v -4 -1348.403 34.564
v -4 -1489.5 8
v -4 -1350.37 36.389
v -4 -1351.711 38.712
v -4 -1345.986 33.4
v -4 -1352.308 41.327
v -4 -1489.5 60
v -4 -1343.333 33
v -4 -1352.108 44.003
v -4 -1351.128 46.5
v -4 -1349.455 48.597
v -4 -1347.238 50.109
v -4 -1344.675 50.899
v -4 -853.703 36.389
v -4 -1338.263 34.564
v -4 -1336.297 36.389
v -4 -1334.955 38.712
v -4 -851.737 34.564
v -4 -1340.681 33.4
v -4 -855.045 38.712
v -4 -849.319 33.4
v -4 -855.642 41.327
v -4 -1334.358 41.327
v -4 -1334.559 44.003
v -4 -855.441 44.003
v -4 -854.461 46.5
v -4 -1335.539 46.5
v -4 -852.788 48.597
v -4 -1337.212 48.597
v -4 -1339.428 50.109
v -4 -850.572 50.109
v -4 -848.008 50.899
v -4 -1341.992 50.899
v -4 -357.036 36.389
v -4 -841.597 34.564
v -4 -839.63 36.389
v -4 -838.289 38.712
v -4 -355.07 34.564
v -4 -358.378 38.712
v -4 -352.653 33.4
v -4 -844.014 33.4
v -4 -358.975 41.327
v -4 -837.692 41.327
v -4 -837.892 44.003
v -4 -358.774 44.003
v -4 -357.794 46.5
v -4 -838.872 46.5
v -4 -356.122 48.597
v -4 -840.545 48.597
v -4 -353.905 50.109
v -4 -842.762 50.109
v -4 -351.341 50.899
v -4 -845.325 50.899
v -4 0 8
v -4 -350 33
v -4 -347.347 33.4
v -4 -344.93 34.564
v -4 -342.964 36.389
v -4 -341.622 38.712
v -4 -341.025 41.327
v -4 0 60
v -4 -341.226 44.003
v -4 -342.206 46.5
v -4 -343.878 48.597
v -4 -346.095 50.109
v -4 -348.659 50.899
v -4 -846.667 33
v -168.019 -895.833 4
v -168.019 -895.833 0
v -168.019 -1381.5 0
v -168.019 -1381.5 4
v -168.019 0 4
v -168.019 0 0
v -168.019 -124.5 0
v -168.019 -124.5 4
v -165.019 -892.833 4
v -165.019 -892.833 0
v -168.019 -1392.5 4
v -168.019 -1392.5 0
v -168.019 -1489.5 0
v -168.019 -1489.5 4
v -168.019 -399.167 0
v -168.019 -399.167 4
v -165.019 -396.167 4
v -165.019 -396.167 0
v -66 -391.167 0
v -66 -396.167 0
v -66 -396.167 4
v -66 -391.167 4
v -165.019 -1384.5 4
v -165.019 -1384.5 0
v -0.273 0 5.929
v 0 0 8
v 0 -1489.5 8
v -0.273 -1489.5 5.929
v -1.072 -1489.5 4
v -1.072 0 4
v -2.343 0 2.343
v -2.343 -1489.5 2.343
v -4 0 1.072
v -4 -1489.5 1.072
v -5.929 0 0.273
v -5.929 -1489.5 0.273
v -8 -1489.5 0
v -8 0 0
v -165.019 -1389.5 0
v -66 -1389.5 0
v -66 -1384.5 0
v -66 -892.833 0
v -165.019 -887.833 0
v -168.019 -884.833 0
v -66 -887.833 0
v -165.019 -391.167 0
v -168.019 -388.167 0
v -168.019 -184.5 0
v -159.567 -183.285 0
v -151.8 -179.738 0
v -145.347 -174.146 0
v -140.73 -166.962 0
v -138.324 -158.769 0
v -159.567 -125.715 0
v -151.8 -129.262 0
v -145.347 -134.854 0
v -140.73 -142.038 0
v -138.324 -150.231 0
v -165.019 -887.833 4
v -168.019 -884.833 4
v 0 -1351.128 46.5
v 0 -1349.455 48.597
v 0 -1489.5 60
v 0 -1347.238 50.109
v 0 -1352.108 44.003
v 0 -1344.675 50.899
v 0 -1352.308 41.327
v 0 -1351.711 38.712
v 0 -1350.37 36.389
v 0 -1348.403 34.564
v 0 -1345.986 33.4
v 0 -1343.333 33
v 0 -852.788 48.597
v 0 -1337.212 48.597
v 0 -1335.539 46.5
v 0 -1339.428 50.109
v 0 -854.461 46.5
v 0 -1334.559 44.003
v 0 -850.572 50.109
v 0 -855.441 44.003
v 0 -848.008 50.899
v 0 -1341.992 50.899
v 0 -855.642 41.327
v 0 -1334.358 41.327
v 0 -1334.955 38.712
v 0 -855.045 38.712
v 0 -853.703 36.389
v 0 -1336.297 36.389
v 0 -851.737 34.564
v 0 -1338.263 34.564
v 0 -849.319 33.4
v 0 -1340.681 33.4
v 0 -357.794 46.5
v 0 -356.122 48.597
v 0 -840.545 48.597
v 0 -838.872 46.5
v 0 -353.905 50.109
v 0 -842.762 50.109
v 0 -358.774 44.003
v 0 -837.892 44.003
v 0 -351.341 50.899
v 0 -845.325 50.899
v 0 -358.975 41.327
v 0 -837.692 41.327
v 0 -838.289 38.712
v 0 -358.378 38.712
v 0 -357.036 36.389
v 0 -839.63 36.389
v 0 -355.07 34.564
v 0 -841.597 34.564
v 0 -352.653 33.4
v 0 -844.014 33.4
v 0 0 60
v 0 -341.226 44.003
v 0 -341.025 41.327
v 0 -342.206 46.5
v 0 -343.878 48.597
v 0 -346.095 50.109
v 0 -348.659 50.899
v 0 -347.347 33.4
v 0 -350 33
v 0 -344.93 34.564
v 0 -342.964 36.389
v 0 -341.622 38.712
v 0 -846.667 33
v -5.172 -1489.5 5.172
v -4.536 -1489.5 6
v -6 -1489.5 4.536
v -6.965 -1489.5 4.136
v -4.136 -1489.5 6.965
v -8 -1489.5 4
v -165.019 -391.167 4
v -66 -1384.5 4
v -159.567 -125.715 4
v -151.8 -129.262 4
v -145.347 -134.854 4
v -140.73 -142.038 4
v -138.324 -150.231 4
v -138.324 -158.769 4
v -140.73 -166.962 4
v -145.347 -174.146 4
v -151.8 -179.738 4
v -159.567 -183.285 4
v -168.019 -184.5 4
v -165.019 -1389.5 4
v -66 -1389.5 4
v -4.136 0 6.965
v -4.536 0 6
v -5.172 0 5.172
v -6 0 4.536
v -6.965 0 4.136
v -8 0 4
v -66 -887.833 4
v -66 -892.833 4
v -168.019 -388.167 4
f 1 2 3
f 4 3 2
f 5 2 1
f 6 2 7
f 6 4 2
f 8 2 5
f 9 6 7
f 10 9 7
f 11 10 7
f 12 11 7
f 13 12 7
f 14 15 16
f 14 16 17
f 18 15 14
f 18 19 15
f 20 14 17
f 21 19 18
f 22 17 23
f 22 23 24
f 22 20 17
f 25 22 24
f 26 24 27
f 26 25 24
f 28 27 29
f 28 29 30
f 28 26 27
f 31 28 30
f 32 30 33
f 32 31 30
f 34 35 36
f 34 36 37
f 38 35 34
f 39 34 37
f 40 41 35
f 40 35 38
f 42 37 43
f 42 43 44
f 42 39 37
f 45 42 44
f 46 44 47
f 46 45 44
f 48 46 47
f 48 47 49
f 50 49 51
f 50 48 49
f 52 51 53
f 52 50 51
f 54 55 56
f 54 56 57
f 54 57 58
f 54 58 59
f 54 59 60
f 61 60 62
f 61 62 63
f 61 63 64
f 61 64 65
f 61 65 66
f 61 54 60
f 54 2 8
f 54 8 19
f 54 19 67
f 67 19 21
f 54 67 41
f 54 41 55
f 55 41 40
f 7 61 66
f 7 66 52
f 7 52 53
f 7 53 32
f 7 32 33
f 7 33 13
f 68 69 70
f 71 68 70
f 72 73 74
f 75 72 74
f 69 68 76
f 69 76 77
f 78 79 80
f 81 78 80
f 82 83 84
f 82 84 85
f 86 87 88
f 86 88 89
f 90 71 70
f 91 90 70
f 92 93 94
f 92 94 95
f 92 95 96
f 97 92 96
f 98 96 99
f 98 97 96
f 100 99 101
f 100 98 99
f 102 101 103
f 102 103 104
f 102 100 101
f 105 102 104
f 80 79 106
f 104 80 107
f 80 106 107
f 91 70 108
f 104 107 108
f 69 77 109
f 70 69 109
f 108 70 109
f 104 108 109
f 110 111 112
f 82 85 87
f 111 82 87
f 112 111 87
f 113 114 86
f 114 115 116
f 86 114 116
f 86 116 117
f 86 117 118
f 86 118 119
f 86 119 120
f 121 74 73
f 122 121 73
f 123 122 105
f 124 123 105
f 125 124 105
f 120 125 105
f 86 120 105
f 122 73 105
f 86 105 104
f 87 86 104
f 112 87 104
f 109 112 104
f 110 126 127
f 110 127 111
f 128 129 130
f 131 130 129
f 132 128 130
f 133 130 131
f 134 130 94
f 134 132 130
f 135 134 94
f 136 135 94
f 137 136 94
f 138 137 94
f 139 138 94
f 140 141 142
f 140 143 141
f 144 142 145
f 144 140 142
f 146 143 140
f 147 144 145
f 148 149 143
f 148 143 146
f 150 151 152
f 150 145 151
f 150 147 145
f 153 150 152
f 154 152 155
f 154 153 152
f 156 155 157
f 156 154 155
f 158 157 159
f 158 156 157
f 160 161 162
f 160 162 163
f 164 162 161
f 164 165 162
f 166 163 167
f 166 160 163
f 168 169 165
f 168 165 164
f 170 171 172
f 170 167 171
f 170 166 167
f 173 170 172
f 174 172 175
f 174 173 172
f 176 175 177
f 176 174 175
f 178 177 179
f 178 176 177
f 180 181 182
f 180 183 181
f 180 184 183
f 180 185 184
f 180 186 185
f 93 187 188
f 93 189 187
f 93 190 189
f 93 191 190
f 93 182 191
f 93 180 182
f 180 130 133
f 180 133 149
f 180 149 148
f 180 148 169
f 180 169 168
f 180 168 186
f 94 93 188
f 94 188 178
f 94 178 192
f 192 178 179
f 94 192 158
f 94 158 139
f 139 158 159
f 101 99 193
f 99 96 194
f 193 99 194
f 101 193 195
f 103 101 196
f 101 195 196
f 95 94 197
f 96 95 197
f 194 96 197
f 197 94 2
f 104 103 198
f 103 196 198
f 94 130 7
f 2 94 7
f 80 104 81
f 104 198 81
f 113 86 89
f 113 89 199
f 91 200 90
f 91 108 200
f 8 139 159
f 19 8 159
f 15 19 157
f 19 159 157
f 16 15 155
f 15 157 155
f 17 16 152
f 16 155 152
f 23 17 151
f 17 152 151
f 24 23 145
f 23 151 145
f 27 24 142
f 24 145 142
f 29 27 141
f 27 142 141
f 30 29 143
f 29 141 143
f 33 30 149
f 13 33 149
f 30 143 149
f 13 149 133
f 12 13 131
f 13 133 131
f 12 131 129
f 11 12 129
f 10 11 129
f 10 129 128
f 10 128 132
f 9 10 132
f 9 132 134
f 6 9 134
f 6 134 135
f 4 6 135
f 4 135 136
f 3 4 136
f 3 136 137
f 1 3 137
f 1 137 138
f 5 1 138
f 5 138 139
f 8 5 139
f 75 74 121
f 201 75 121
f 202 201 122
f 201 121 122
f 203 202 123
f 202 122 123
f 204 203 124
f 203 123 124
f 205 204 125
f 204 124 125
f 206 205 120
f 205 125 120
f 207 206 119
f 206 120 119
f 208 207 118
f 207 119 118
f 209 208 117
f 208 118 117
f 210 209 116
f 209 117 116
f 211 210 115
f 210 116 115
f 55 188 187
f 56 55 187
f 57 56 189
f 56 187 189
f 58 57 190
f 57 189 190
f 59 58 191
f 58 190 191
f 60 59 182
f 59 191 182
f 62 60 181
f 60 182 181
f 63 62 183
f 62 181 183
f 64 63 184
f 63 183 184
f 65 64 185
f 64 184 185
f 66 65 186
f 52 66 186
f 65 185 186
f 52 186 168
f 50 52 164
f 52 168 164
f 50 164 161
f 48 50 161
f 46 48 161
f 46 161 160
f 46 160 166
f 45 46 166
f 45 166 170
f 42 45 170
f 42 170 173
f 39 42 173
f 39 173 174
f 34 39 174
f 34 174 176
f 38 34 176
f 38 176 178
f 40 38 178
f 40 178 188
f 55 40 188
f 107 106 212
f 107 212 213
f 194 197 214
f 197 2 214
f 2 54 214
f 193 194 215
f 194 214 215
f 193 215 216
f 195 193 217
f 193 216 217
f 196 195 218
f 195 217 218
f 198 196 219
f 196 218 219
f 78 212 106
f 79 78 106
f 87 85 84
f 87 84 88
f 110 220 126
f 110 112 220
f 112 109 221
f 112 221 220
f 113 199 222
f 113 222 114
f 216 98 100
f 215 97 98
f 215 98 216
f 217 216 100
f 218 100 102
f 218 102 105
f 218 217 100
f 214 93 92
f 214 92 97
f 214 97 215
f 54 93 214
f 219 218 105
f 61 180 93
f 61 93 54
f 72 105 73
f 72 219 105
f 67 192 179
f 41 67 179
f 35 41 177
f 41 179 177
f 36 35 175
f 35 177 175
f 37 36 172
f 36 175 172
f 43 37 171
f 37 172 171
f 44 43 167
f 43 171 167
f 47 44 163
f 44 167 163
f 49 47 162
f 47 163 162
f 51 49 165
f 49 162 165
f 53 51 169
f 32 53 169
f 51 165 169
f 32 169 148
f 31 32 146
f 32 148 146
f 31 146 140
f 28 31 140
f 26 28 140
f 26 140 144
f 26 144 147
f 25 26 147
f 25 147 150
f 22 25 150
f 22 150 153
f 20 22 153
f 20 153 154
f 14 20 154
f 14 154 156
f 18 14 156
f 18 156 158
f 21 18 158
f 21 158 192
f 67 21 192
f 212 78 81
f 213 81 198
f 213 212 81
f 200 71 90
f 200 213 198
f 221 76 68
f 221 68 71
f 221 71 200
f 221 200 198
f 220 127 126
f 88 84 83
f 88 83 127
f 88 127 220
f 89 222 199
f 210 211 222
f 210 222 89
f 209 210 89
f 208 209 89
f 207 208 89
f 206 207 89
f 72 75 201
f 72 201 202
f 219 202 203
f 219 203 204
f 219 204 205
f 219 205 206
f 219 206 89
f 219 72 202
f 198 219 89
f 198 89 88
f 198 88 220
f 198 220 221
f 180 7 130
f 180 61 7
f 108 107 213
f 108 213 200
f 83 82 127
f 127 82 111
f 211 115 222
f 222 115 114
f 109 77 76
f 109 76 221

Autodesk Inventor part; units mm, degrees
ref_plane "YZ Plane" through (0, 0, 0) normal (1, 0, 0) x (0, 1, 0)
ref_plane "XZ Plane" through (0, 0, 0) normal (0, 1, 0) x (-1, 0, 0)
ref_plane "XY Plane" through (0, 0, 0) normal (0, 0, 1) x (1, 0, 0)
sketch "Sketch1" plane through (0, 0, 0) normal (0, 0, 1) x (1, 0, 0)
  line L0 (0, 0) -> (-168.019, 0)
  line L1 (-168.019, 0) -> (-168.019, -1489.5)
  line L2 (-168.019, -1489.5) -> (0, -1489.5)
  line L3 (0, -1489.5) -> (0, 0)
  line L4 (-168.019, -1389.5) -> (-66, -1389.5)
  line L5 (-66, -1389.5) -> (-66, -1384.5)
  line L6 (-66, -1384.5) -> (-168.019, -1384.5)
  line L7 (-168.019, -1384.5) -> (-168.019, -1389.5)
  line L8 (-168.019, -892.8333) -> (-66, -892.8333)
  line L9 (-66, -892.8333) -> (-66, -887.8333)
  line L10 (-66, -887.8333) -> (-168.019, -887.8333)
  line L11 (-168.019, -887.8333) -> (-168.019, -892.8333)
  line L12 (-168.019, -396.1667) -> (-66, -396.1667)
  line L13 (-66, -396.1667) -> (-66, -391.1667)
  line L14 (-66, -391.1667) -> (-168.019, -391.1667)
  line L15 (-168.019, -391.1667) -> (-168.019, -396.1667)
  circle A0 centre (-168.019, -154.5) radius 30
  point P0 (-168.019, -396.1667)
  point P1 (-168.019, -124.5)
  point P2 (-168.019, -184.5)
  dimension "d0" = 1489.5
  dimension "d1" = 168.019
  dimension "d2" = 5
  dimension "d4" = 100
  dimension "d7" = 496.6667
  dimension "d23" = 66
  dimension "d28" = 60
  dimension "d29" = 1335
extrude "Plate1" add sketch "Sketch1" along normal blind 4 contours L3 L2 L1 L4 L5 L6 L8 L9 L10 L12 L13 L14 A0 L0
sketch "Sketch2" plane through (-4, 0, 0) normal (1, 0, 0) x (0, 1, 0)
  line L0 (-1489.5, 0) -> (0, 0)
  line L1 (0, 0) -> (0, 60)
  line L2 (0, 60) -> (-1489.5, 60)
  line L3 (-1489.5, 60) -> (-1489.5, 0)
edge flange "Flange1" height 60 angle 90 thickness 4 bend radius 4 thickness toward (1, 0, 0) relief tear relief width 4 relief depth 2 edges at (0, -744.75, 4) wall of the first edge with corners at (-4, -1489.5, 0) (-4, 0, 0) (-4, 0, 60) (-4, -1489.5, 60)
bend "Bend1"
corner "Corner1"
chamfer "Corner Chamfer1" distance 3 angle 45 6 edges at (-168.019, -1389.5, 2) (-168.019, -1384.5, 2) (-168.019, -892.8333, 2) (-168.019, -887.8333, 2) (-168.019, -391.1667, 2) (-168.019, -396.1667, 2)
sketch "Sketch4" plane through (0, -1489.5, 60) normal (1, 0, 0) x (0, 0, -1)
  line L0 (52, 0) -> (52, 1489.5) construction
  line L1 (0, 1489.5) -> (52, 1489.5) construction
  line L2 (0, 0) -> (0, 1489.5) construction
  line L3 (52, 0) -> (0, 0) construction
  circle A0 centre (18, 1139.5) radius 9
  circle A1 centre (18, 642.8333) radius 9
  circle A2 centre (18, 146.1667) radius 9
  point P0 (60, 1489.5)
  dimension "d30" = 18
  dimension "d31" = 18
  dimension "d32" = 350
  dimension "d35" = 496.6667
extrude "Cut1" cut sketch "Sketch4" against normal blind 4
equation "\"d0\" = Стрингер_длина"
equation "\"d1\" = стрингер_глубина_3"
equation "\"d2\" = паз_под_стрингер_толщина"
equation "\"d7\" = Шаг_шпангоутов"
equation "\"d23\" = паз_под_стрингер_глубина - Thickness"
equation "\"d28\" = 2 * радиус_выреза_под_сварку"
equation "\"d35\" = Шаг_шпангоутов"
equation "\"d40\" = Thickness"
equation "\"d12\" = Thickness"
equation "\"d13\" = BendReliefWidth"
equation "\"d14\" = BendReliefDepth"
equation "\"d15\" = MinimumRemnant"
equation "\"d16\" = TransitionRadius"
equation "\"d17\" = ребро_усилителей"
equation "\"d19\" = BendRadius"
equation "\"d20\" = CornerReliefSize"
equation "\"d21\" = GapSize"
equation "\"d22\" = JacobiRadiusSize"
equation "\"BendRadius\" = Thickness"
equation "\"BendReliefWidth\" = Thickness"
equation "\"BendReliefDepth\" = 0.5 * Thickness"
equation "\"CornerReliefSize\" = 4 * Thickness"
equation "\"MinimumRemnant\" = 2 * Thickness"
equation "\"TransitionRadius\" = BendRadius"
equation "\"JacobiRadiusSize\" = BendRadius"
equation "\"GapSize\" = Thickness"
equation "\"Стрингер_длина\" = 1489.5"
equation "\"стрингер_глубина_3\" = 168.018988"
equation "\"паз_под_стрингер_толщина\" = 5"
equation "\"Шаг_шпангоутов\" = 496.666667"
equation "\"паз_под_стрингер_глубина\" = 70"
equation "\"Thickness\" = 4"
equation "\"радиус_выреза_под_сварку\" = 30"
equation "\"ребро_усилителей\" = 60"
properties part number "GBK 0104 stringer 3" material "Steel"
